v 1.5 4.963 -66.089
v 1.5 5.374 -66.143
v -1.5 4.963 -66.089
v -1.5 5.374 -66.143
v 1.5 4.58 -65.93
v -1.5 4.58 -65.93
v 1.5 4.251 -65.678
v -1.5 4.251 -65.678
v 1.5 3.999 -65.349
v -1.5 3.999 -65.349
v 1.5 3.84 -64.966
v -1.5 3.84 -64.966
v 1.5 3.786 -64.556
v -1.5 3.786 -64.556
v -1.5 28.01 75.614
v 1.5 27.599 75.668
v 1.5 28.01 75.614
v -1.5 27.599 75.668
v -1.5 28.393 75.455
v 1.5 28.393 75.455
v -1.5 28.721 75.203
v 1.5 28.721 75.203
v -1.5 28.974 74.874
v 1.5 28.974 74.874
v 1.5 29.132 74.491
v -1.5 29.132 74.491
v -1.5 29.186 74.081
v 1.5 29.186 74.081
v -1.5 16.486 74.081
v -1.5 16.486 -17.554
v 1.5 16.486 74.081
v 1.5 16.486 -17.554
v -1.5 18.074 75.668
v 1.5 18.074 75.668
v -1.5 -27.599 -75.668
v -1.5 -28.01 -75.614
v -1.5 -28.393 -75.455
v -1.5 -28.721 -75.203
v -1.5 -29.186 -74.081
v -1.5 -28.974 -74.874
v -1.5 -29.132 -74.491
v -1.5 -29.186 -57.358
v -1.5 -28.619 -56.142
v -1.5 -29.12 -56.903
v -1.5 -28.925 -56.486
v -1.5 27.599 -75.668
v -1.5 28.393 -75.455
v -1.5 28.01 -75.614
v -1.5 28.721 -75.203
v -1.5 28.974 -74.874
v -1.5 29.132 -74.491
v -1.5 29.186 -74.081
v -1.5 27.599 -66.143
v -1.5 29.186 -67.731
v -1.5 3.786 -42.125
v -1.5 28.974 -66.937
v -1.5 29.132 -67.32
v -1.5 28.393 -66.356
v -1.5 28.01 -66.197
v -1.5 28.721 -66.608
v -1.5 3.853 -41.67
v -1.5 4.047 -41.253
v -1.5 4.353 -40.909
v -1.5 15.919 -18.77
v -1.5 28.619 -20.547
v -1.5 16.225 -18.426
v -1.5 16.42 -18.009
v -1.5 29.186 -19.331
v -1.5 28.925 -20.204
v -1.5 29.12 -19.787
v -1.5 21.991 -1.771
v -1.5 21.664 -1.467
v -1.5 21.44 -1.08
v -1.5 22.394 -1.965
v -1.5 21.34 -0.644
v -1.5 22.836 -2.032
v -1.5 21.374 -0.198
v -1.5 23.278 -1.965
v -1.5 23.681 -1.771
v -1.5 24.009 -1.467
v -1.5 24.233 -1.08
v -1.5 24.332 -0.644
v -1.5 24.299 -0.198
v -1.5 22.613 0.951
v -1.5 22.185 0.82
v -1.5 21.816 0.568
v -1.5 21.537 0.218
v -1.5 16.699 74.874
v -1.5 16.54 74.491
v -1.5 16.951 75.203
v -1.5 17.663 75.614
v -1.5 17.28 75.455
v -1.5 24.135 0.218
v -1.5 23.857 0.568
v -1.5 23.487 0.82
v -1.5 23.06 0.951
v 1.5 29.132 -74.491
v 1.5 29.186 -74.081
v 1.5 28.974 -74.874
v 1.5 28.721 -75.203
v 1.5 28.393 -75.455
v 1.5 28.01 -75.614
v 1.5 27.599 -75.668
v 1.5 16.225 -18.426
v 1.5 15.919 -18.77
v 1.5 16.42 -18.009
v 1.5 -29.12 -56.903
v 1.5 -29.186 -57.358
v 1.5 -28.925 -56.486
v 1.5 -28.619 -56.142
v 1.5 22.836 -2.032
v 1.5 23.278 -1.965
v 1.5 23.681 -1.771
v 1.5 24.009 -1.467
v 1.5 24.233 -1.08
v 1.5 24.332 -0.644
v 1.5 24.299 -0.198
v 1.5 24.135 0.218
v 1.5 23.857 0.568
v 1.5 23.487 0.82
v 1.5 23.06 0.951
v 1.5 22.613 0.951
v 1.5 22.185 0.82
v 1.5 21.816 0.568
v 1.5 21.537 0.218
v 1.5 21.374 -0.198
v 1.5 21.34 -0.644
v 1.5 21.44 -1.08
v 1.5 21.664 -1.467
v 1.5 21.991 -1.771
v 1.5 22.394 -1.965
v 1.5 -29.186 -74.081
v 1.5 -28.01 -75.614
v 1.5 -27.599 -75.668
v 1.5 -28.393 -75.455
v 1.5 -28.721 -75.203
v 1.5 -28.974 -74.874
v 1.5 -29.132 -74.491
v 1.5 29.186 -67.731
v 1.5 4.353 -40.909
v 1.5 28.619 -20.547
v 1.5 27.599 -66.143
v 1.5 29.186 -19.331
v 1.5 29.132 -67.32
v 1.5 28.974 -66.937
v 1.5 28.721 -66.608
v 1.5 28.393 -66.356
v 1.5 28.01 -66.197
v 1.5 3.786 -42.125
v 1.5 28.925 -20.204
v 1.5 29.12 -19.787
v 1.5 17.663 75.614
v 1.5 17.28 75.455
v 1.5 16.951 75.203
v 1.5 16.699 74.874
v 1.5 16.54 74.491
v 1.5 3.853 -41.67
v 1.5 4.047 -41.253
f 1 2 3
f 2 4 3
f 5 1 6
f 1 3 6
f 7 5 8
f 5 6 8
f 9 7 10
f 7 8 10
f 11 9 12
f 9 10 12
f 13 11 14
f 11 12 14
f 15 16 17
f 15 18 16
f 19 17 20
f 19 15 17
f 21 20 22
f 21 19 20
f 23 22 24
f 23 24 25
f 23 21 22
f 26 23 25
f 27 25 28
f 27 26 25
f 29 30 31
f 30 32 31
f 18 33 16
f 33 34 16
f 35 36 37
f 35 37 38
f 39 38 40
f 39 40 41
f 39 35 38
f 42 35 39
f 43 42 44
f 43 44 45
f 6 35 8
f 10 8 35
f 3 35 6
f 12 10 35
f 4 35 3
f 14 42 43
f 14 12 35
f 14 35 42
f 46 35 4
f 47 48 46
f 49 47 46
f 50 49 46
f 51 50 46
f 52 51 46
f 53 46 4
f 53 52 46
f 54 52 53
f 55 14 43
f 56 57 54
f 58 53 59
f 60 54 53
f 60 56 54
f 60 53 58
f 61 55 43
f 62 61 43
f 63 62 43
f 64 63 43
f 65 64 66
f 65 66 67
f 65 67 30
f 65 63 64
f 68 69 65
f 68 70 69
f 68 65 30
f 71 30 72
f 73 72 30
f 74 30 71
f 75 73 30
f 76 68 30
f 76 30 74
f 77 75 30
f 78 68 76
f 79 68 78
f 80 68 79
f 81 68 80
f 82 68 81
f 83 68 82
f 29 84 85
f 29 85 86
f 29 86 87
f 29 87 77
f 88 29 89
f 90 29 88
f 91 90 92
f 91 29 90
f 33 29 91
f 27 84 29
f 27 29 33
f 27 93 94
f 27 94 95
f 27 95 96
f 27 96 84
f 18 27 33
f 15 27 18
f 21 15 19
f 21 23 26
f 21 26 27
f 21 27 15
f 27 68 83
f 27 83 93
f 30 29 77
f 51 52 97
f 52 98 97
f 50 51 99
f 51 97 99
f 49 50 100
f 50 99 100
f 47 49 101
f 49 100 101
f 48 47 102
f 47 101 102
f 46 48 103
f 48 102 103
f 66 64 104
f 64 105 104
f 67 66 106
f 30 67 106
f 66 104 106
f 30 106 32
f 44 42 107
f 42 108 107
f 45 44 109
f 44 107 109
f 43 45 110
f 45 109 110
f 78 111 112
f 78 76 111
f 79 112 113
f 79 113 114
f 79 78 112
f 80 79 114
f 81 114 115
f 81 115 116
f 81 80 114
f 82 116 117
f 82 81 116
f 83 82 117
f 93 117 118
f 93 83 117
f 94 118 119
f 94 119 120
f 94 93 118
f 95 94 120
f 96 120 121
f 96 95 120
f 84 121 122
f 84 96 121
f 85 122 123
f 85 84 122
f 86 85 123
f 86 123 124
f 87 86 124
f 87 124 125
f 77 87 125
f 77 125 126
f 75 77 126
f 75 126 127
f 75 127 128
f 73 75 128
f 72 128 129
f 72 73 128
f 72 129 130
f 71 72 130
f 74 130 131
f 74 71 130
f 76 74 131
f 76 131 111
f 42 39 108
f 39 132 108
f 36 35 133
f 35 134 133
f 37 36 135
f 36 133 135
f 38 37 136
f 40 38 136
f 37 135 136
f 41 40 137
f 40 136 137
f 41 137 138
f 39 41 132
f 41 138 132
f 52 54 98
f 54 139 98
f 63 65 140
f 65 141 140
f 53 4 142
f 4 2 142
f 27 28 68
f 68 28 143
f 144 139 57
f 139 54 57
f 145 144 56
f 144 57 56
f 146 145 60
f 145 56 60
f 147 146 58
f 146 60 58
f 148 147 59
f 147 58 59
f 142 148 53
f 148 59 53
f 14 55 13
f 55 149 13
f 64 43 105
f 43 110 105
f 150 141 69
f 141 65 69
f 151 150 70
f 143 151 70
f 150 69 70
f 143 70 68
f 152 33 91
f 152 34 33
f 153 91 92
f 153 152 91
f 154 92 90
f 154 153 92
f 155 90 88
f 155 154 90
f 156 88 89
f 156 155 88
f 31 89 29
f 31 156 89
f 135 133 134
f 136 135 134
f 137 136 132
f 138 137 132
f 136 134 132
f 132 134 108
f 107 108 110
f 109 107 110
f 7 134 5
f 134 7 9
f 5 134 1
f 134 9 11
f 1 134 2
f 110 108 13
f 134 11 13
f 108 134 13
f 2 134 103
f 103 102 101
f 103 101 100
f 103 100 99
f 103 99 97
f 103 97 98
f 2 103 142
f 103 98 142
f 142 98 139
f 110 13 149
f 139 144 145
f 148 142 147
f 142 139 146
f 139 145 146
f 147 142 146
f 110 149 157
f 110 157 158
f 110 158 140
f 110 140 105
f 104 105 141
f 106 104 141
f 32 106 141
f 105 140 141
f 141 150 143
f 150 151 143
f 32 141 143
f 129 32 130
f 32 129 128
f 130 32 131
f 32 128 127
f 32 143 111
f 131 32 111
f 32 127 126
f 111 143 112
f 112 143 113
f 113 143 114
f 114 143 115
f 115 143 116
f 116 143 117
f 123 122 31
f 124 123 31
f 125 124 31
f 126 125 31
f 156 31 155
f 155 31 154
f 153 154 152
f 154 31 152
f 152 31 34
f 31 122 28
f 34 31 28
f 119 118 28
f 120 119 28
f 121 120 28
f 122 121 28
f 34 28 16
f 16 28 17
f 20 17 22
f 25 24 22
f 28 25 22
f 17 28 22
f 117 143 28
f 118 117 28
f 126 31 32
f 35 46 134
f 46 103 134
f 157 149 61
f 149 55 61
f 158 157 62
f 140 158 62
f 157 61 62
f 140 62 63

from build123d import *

# Parameters (mm, degrees)
SKETCH1_R           = 1.5
BOSS_EXTRUDE1_DEPTH = 1.5
FILLET1_R           = 1.5875


with BuildPart() as part:
    # Sketch1 → Boss-Extrude1 (new, symmetric)
    with BuildSketch(Plane(origin=(0, 0, 0), x_dir=(0, 0, -1), z_dir=(1, 0, 0))):
        Polygon((-75.668068816, 16.486293283), (-75.668068816, 29.186293283), (20.071657388, 29.186293283), (41.38478802, 3.786293283), (66.143068816, 3.786293283), (66.143068816, 29.186293283), (75.668068816, 29.186293283), (75.668068816, -29.186293283), (56.618068816, -29.186293283), (18.294218273, 16.486293283), align=None)
        with Locations((0.531931184, 22.836293283)):
            Circle(SKETCH1_R, mode=Mode.SUBTRACT)
    extrude(amount=BOSS_EXTRUDE1_DEPTH, both=True)

    # Fillet1
    fillet1_edges = [part.edges().sort_by_distance(p)[0] for p in [
        (0, 29.186293283, -20.071657388),
        (0, 3.786293283, -41.38478802),
        (0, 3.786293283, -66.143068816),
        (0, 29.186293283, -66.143068816),
        (0, 29.186293283, -75.668068816),
        (0, -29.186293283, -75.668068816),
        (0, -29.186293283, -56.618068816),
        (0, 16.486293283, -18.294218273),
        (0, 16.486293283, 75.668068816),
        (0, 29.186293283, 75.668068816),
    ]]
    fillet(fillet1_edges, radius=FILLET1_R)


solid = part.part
